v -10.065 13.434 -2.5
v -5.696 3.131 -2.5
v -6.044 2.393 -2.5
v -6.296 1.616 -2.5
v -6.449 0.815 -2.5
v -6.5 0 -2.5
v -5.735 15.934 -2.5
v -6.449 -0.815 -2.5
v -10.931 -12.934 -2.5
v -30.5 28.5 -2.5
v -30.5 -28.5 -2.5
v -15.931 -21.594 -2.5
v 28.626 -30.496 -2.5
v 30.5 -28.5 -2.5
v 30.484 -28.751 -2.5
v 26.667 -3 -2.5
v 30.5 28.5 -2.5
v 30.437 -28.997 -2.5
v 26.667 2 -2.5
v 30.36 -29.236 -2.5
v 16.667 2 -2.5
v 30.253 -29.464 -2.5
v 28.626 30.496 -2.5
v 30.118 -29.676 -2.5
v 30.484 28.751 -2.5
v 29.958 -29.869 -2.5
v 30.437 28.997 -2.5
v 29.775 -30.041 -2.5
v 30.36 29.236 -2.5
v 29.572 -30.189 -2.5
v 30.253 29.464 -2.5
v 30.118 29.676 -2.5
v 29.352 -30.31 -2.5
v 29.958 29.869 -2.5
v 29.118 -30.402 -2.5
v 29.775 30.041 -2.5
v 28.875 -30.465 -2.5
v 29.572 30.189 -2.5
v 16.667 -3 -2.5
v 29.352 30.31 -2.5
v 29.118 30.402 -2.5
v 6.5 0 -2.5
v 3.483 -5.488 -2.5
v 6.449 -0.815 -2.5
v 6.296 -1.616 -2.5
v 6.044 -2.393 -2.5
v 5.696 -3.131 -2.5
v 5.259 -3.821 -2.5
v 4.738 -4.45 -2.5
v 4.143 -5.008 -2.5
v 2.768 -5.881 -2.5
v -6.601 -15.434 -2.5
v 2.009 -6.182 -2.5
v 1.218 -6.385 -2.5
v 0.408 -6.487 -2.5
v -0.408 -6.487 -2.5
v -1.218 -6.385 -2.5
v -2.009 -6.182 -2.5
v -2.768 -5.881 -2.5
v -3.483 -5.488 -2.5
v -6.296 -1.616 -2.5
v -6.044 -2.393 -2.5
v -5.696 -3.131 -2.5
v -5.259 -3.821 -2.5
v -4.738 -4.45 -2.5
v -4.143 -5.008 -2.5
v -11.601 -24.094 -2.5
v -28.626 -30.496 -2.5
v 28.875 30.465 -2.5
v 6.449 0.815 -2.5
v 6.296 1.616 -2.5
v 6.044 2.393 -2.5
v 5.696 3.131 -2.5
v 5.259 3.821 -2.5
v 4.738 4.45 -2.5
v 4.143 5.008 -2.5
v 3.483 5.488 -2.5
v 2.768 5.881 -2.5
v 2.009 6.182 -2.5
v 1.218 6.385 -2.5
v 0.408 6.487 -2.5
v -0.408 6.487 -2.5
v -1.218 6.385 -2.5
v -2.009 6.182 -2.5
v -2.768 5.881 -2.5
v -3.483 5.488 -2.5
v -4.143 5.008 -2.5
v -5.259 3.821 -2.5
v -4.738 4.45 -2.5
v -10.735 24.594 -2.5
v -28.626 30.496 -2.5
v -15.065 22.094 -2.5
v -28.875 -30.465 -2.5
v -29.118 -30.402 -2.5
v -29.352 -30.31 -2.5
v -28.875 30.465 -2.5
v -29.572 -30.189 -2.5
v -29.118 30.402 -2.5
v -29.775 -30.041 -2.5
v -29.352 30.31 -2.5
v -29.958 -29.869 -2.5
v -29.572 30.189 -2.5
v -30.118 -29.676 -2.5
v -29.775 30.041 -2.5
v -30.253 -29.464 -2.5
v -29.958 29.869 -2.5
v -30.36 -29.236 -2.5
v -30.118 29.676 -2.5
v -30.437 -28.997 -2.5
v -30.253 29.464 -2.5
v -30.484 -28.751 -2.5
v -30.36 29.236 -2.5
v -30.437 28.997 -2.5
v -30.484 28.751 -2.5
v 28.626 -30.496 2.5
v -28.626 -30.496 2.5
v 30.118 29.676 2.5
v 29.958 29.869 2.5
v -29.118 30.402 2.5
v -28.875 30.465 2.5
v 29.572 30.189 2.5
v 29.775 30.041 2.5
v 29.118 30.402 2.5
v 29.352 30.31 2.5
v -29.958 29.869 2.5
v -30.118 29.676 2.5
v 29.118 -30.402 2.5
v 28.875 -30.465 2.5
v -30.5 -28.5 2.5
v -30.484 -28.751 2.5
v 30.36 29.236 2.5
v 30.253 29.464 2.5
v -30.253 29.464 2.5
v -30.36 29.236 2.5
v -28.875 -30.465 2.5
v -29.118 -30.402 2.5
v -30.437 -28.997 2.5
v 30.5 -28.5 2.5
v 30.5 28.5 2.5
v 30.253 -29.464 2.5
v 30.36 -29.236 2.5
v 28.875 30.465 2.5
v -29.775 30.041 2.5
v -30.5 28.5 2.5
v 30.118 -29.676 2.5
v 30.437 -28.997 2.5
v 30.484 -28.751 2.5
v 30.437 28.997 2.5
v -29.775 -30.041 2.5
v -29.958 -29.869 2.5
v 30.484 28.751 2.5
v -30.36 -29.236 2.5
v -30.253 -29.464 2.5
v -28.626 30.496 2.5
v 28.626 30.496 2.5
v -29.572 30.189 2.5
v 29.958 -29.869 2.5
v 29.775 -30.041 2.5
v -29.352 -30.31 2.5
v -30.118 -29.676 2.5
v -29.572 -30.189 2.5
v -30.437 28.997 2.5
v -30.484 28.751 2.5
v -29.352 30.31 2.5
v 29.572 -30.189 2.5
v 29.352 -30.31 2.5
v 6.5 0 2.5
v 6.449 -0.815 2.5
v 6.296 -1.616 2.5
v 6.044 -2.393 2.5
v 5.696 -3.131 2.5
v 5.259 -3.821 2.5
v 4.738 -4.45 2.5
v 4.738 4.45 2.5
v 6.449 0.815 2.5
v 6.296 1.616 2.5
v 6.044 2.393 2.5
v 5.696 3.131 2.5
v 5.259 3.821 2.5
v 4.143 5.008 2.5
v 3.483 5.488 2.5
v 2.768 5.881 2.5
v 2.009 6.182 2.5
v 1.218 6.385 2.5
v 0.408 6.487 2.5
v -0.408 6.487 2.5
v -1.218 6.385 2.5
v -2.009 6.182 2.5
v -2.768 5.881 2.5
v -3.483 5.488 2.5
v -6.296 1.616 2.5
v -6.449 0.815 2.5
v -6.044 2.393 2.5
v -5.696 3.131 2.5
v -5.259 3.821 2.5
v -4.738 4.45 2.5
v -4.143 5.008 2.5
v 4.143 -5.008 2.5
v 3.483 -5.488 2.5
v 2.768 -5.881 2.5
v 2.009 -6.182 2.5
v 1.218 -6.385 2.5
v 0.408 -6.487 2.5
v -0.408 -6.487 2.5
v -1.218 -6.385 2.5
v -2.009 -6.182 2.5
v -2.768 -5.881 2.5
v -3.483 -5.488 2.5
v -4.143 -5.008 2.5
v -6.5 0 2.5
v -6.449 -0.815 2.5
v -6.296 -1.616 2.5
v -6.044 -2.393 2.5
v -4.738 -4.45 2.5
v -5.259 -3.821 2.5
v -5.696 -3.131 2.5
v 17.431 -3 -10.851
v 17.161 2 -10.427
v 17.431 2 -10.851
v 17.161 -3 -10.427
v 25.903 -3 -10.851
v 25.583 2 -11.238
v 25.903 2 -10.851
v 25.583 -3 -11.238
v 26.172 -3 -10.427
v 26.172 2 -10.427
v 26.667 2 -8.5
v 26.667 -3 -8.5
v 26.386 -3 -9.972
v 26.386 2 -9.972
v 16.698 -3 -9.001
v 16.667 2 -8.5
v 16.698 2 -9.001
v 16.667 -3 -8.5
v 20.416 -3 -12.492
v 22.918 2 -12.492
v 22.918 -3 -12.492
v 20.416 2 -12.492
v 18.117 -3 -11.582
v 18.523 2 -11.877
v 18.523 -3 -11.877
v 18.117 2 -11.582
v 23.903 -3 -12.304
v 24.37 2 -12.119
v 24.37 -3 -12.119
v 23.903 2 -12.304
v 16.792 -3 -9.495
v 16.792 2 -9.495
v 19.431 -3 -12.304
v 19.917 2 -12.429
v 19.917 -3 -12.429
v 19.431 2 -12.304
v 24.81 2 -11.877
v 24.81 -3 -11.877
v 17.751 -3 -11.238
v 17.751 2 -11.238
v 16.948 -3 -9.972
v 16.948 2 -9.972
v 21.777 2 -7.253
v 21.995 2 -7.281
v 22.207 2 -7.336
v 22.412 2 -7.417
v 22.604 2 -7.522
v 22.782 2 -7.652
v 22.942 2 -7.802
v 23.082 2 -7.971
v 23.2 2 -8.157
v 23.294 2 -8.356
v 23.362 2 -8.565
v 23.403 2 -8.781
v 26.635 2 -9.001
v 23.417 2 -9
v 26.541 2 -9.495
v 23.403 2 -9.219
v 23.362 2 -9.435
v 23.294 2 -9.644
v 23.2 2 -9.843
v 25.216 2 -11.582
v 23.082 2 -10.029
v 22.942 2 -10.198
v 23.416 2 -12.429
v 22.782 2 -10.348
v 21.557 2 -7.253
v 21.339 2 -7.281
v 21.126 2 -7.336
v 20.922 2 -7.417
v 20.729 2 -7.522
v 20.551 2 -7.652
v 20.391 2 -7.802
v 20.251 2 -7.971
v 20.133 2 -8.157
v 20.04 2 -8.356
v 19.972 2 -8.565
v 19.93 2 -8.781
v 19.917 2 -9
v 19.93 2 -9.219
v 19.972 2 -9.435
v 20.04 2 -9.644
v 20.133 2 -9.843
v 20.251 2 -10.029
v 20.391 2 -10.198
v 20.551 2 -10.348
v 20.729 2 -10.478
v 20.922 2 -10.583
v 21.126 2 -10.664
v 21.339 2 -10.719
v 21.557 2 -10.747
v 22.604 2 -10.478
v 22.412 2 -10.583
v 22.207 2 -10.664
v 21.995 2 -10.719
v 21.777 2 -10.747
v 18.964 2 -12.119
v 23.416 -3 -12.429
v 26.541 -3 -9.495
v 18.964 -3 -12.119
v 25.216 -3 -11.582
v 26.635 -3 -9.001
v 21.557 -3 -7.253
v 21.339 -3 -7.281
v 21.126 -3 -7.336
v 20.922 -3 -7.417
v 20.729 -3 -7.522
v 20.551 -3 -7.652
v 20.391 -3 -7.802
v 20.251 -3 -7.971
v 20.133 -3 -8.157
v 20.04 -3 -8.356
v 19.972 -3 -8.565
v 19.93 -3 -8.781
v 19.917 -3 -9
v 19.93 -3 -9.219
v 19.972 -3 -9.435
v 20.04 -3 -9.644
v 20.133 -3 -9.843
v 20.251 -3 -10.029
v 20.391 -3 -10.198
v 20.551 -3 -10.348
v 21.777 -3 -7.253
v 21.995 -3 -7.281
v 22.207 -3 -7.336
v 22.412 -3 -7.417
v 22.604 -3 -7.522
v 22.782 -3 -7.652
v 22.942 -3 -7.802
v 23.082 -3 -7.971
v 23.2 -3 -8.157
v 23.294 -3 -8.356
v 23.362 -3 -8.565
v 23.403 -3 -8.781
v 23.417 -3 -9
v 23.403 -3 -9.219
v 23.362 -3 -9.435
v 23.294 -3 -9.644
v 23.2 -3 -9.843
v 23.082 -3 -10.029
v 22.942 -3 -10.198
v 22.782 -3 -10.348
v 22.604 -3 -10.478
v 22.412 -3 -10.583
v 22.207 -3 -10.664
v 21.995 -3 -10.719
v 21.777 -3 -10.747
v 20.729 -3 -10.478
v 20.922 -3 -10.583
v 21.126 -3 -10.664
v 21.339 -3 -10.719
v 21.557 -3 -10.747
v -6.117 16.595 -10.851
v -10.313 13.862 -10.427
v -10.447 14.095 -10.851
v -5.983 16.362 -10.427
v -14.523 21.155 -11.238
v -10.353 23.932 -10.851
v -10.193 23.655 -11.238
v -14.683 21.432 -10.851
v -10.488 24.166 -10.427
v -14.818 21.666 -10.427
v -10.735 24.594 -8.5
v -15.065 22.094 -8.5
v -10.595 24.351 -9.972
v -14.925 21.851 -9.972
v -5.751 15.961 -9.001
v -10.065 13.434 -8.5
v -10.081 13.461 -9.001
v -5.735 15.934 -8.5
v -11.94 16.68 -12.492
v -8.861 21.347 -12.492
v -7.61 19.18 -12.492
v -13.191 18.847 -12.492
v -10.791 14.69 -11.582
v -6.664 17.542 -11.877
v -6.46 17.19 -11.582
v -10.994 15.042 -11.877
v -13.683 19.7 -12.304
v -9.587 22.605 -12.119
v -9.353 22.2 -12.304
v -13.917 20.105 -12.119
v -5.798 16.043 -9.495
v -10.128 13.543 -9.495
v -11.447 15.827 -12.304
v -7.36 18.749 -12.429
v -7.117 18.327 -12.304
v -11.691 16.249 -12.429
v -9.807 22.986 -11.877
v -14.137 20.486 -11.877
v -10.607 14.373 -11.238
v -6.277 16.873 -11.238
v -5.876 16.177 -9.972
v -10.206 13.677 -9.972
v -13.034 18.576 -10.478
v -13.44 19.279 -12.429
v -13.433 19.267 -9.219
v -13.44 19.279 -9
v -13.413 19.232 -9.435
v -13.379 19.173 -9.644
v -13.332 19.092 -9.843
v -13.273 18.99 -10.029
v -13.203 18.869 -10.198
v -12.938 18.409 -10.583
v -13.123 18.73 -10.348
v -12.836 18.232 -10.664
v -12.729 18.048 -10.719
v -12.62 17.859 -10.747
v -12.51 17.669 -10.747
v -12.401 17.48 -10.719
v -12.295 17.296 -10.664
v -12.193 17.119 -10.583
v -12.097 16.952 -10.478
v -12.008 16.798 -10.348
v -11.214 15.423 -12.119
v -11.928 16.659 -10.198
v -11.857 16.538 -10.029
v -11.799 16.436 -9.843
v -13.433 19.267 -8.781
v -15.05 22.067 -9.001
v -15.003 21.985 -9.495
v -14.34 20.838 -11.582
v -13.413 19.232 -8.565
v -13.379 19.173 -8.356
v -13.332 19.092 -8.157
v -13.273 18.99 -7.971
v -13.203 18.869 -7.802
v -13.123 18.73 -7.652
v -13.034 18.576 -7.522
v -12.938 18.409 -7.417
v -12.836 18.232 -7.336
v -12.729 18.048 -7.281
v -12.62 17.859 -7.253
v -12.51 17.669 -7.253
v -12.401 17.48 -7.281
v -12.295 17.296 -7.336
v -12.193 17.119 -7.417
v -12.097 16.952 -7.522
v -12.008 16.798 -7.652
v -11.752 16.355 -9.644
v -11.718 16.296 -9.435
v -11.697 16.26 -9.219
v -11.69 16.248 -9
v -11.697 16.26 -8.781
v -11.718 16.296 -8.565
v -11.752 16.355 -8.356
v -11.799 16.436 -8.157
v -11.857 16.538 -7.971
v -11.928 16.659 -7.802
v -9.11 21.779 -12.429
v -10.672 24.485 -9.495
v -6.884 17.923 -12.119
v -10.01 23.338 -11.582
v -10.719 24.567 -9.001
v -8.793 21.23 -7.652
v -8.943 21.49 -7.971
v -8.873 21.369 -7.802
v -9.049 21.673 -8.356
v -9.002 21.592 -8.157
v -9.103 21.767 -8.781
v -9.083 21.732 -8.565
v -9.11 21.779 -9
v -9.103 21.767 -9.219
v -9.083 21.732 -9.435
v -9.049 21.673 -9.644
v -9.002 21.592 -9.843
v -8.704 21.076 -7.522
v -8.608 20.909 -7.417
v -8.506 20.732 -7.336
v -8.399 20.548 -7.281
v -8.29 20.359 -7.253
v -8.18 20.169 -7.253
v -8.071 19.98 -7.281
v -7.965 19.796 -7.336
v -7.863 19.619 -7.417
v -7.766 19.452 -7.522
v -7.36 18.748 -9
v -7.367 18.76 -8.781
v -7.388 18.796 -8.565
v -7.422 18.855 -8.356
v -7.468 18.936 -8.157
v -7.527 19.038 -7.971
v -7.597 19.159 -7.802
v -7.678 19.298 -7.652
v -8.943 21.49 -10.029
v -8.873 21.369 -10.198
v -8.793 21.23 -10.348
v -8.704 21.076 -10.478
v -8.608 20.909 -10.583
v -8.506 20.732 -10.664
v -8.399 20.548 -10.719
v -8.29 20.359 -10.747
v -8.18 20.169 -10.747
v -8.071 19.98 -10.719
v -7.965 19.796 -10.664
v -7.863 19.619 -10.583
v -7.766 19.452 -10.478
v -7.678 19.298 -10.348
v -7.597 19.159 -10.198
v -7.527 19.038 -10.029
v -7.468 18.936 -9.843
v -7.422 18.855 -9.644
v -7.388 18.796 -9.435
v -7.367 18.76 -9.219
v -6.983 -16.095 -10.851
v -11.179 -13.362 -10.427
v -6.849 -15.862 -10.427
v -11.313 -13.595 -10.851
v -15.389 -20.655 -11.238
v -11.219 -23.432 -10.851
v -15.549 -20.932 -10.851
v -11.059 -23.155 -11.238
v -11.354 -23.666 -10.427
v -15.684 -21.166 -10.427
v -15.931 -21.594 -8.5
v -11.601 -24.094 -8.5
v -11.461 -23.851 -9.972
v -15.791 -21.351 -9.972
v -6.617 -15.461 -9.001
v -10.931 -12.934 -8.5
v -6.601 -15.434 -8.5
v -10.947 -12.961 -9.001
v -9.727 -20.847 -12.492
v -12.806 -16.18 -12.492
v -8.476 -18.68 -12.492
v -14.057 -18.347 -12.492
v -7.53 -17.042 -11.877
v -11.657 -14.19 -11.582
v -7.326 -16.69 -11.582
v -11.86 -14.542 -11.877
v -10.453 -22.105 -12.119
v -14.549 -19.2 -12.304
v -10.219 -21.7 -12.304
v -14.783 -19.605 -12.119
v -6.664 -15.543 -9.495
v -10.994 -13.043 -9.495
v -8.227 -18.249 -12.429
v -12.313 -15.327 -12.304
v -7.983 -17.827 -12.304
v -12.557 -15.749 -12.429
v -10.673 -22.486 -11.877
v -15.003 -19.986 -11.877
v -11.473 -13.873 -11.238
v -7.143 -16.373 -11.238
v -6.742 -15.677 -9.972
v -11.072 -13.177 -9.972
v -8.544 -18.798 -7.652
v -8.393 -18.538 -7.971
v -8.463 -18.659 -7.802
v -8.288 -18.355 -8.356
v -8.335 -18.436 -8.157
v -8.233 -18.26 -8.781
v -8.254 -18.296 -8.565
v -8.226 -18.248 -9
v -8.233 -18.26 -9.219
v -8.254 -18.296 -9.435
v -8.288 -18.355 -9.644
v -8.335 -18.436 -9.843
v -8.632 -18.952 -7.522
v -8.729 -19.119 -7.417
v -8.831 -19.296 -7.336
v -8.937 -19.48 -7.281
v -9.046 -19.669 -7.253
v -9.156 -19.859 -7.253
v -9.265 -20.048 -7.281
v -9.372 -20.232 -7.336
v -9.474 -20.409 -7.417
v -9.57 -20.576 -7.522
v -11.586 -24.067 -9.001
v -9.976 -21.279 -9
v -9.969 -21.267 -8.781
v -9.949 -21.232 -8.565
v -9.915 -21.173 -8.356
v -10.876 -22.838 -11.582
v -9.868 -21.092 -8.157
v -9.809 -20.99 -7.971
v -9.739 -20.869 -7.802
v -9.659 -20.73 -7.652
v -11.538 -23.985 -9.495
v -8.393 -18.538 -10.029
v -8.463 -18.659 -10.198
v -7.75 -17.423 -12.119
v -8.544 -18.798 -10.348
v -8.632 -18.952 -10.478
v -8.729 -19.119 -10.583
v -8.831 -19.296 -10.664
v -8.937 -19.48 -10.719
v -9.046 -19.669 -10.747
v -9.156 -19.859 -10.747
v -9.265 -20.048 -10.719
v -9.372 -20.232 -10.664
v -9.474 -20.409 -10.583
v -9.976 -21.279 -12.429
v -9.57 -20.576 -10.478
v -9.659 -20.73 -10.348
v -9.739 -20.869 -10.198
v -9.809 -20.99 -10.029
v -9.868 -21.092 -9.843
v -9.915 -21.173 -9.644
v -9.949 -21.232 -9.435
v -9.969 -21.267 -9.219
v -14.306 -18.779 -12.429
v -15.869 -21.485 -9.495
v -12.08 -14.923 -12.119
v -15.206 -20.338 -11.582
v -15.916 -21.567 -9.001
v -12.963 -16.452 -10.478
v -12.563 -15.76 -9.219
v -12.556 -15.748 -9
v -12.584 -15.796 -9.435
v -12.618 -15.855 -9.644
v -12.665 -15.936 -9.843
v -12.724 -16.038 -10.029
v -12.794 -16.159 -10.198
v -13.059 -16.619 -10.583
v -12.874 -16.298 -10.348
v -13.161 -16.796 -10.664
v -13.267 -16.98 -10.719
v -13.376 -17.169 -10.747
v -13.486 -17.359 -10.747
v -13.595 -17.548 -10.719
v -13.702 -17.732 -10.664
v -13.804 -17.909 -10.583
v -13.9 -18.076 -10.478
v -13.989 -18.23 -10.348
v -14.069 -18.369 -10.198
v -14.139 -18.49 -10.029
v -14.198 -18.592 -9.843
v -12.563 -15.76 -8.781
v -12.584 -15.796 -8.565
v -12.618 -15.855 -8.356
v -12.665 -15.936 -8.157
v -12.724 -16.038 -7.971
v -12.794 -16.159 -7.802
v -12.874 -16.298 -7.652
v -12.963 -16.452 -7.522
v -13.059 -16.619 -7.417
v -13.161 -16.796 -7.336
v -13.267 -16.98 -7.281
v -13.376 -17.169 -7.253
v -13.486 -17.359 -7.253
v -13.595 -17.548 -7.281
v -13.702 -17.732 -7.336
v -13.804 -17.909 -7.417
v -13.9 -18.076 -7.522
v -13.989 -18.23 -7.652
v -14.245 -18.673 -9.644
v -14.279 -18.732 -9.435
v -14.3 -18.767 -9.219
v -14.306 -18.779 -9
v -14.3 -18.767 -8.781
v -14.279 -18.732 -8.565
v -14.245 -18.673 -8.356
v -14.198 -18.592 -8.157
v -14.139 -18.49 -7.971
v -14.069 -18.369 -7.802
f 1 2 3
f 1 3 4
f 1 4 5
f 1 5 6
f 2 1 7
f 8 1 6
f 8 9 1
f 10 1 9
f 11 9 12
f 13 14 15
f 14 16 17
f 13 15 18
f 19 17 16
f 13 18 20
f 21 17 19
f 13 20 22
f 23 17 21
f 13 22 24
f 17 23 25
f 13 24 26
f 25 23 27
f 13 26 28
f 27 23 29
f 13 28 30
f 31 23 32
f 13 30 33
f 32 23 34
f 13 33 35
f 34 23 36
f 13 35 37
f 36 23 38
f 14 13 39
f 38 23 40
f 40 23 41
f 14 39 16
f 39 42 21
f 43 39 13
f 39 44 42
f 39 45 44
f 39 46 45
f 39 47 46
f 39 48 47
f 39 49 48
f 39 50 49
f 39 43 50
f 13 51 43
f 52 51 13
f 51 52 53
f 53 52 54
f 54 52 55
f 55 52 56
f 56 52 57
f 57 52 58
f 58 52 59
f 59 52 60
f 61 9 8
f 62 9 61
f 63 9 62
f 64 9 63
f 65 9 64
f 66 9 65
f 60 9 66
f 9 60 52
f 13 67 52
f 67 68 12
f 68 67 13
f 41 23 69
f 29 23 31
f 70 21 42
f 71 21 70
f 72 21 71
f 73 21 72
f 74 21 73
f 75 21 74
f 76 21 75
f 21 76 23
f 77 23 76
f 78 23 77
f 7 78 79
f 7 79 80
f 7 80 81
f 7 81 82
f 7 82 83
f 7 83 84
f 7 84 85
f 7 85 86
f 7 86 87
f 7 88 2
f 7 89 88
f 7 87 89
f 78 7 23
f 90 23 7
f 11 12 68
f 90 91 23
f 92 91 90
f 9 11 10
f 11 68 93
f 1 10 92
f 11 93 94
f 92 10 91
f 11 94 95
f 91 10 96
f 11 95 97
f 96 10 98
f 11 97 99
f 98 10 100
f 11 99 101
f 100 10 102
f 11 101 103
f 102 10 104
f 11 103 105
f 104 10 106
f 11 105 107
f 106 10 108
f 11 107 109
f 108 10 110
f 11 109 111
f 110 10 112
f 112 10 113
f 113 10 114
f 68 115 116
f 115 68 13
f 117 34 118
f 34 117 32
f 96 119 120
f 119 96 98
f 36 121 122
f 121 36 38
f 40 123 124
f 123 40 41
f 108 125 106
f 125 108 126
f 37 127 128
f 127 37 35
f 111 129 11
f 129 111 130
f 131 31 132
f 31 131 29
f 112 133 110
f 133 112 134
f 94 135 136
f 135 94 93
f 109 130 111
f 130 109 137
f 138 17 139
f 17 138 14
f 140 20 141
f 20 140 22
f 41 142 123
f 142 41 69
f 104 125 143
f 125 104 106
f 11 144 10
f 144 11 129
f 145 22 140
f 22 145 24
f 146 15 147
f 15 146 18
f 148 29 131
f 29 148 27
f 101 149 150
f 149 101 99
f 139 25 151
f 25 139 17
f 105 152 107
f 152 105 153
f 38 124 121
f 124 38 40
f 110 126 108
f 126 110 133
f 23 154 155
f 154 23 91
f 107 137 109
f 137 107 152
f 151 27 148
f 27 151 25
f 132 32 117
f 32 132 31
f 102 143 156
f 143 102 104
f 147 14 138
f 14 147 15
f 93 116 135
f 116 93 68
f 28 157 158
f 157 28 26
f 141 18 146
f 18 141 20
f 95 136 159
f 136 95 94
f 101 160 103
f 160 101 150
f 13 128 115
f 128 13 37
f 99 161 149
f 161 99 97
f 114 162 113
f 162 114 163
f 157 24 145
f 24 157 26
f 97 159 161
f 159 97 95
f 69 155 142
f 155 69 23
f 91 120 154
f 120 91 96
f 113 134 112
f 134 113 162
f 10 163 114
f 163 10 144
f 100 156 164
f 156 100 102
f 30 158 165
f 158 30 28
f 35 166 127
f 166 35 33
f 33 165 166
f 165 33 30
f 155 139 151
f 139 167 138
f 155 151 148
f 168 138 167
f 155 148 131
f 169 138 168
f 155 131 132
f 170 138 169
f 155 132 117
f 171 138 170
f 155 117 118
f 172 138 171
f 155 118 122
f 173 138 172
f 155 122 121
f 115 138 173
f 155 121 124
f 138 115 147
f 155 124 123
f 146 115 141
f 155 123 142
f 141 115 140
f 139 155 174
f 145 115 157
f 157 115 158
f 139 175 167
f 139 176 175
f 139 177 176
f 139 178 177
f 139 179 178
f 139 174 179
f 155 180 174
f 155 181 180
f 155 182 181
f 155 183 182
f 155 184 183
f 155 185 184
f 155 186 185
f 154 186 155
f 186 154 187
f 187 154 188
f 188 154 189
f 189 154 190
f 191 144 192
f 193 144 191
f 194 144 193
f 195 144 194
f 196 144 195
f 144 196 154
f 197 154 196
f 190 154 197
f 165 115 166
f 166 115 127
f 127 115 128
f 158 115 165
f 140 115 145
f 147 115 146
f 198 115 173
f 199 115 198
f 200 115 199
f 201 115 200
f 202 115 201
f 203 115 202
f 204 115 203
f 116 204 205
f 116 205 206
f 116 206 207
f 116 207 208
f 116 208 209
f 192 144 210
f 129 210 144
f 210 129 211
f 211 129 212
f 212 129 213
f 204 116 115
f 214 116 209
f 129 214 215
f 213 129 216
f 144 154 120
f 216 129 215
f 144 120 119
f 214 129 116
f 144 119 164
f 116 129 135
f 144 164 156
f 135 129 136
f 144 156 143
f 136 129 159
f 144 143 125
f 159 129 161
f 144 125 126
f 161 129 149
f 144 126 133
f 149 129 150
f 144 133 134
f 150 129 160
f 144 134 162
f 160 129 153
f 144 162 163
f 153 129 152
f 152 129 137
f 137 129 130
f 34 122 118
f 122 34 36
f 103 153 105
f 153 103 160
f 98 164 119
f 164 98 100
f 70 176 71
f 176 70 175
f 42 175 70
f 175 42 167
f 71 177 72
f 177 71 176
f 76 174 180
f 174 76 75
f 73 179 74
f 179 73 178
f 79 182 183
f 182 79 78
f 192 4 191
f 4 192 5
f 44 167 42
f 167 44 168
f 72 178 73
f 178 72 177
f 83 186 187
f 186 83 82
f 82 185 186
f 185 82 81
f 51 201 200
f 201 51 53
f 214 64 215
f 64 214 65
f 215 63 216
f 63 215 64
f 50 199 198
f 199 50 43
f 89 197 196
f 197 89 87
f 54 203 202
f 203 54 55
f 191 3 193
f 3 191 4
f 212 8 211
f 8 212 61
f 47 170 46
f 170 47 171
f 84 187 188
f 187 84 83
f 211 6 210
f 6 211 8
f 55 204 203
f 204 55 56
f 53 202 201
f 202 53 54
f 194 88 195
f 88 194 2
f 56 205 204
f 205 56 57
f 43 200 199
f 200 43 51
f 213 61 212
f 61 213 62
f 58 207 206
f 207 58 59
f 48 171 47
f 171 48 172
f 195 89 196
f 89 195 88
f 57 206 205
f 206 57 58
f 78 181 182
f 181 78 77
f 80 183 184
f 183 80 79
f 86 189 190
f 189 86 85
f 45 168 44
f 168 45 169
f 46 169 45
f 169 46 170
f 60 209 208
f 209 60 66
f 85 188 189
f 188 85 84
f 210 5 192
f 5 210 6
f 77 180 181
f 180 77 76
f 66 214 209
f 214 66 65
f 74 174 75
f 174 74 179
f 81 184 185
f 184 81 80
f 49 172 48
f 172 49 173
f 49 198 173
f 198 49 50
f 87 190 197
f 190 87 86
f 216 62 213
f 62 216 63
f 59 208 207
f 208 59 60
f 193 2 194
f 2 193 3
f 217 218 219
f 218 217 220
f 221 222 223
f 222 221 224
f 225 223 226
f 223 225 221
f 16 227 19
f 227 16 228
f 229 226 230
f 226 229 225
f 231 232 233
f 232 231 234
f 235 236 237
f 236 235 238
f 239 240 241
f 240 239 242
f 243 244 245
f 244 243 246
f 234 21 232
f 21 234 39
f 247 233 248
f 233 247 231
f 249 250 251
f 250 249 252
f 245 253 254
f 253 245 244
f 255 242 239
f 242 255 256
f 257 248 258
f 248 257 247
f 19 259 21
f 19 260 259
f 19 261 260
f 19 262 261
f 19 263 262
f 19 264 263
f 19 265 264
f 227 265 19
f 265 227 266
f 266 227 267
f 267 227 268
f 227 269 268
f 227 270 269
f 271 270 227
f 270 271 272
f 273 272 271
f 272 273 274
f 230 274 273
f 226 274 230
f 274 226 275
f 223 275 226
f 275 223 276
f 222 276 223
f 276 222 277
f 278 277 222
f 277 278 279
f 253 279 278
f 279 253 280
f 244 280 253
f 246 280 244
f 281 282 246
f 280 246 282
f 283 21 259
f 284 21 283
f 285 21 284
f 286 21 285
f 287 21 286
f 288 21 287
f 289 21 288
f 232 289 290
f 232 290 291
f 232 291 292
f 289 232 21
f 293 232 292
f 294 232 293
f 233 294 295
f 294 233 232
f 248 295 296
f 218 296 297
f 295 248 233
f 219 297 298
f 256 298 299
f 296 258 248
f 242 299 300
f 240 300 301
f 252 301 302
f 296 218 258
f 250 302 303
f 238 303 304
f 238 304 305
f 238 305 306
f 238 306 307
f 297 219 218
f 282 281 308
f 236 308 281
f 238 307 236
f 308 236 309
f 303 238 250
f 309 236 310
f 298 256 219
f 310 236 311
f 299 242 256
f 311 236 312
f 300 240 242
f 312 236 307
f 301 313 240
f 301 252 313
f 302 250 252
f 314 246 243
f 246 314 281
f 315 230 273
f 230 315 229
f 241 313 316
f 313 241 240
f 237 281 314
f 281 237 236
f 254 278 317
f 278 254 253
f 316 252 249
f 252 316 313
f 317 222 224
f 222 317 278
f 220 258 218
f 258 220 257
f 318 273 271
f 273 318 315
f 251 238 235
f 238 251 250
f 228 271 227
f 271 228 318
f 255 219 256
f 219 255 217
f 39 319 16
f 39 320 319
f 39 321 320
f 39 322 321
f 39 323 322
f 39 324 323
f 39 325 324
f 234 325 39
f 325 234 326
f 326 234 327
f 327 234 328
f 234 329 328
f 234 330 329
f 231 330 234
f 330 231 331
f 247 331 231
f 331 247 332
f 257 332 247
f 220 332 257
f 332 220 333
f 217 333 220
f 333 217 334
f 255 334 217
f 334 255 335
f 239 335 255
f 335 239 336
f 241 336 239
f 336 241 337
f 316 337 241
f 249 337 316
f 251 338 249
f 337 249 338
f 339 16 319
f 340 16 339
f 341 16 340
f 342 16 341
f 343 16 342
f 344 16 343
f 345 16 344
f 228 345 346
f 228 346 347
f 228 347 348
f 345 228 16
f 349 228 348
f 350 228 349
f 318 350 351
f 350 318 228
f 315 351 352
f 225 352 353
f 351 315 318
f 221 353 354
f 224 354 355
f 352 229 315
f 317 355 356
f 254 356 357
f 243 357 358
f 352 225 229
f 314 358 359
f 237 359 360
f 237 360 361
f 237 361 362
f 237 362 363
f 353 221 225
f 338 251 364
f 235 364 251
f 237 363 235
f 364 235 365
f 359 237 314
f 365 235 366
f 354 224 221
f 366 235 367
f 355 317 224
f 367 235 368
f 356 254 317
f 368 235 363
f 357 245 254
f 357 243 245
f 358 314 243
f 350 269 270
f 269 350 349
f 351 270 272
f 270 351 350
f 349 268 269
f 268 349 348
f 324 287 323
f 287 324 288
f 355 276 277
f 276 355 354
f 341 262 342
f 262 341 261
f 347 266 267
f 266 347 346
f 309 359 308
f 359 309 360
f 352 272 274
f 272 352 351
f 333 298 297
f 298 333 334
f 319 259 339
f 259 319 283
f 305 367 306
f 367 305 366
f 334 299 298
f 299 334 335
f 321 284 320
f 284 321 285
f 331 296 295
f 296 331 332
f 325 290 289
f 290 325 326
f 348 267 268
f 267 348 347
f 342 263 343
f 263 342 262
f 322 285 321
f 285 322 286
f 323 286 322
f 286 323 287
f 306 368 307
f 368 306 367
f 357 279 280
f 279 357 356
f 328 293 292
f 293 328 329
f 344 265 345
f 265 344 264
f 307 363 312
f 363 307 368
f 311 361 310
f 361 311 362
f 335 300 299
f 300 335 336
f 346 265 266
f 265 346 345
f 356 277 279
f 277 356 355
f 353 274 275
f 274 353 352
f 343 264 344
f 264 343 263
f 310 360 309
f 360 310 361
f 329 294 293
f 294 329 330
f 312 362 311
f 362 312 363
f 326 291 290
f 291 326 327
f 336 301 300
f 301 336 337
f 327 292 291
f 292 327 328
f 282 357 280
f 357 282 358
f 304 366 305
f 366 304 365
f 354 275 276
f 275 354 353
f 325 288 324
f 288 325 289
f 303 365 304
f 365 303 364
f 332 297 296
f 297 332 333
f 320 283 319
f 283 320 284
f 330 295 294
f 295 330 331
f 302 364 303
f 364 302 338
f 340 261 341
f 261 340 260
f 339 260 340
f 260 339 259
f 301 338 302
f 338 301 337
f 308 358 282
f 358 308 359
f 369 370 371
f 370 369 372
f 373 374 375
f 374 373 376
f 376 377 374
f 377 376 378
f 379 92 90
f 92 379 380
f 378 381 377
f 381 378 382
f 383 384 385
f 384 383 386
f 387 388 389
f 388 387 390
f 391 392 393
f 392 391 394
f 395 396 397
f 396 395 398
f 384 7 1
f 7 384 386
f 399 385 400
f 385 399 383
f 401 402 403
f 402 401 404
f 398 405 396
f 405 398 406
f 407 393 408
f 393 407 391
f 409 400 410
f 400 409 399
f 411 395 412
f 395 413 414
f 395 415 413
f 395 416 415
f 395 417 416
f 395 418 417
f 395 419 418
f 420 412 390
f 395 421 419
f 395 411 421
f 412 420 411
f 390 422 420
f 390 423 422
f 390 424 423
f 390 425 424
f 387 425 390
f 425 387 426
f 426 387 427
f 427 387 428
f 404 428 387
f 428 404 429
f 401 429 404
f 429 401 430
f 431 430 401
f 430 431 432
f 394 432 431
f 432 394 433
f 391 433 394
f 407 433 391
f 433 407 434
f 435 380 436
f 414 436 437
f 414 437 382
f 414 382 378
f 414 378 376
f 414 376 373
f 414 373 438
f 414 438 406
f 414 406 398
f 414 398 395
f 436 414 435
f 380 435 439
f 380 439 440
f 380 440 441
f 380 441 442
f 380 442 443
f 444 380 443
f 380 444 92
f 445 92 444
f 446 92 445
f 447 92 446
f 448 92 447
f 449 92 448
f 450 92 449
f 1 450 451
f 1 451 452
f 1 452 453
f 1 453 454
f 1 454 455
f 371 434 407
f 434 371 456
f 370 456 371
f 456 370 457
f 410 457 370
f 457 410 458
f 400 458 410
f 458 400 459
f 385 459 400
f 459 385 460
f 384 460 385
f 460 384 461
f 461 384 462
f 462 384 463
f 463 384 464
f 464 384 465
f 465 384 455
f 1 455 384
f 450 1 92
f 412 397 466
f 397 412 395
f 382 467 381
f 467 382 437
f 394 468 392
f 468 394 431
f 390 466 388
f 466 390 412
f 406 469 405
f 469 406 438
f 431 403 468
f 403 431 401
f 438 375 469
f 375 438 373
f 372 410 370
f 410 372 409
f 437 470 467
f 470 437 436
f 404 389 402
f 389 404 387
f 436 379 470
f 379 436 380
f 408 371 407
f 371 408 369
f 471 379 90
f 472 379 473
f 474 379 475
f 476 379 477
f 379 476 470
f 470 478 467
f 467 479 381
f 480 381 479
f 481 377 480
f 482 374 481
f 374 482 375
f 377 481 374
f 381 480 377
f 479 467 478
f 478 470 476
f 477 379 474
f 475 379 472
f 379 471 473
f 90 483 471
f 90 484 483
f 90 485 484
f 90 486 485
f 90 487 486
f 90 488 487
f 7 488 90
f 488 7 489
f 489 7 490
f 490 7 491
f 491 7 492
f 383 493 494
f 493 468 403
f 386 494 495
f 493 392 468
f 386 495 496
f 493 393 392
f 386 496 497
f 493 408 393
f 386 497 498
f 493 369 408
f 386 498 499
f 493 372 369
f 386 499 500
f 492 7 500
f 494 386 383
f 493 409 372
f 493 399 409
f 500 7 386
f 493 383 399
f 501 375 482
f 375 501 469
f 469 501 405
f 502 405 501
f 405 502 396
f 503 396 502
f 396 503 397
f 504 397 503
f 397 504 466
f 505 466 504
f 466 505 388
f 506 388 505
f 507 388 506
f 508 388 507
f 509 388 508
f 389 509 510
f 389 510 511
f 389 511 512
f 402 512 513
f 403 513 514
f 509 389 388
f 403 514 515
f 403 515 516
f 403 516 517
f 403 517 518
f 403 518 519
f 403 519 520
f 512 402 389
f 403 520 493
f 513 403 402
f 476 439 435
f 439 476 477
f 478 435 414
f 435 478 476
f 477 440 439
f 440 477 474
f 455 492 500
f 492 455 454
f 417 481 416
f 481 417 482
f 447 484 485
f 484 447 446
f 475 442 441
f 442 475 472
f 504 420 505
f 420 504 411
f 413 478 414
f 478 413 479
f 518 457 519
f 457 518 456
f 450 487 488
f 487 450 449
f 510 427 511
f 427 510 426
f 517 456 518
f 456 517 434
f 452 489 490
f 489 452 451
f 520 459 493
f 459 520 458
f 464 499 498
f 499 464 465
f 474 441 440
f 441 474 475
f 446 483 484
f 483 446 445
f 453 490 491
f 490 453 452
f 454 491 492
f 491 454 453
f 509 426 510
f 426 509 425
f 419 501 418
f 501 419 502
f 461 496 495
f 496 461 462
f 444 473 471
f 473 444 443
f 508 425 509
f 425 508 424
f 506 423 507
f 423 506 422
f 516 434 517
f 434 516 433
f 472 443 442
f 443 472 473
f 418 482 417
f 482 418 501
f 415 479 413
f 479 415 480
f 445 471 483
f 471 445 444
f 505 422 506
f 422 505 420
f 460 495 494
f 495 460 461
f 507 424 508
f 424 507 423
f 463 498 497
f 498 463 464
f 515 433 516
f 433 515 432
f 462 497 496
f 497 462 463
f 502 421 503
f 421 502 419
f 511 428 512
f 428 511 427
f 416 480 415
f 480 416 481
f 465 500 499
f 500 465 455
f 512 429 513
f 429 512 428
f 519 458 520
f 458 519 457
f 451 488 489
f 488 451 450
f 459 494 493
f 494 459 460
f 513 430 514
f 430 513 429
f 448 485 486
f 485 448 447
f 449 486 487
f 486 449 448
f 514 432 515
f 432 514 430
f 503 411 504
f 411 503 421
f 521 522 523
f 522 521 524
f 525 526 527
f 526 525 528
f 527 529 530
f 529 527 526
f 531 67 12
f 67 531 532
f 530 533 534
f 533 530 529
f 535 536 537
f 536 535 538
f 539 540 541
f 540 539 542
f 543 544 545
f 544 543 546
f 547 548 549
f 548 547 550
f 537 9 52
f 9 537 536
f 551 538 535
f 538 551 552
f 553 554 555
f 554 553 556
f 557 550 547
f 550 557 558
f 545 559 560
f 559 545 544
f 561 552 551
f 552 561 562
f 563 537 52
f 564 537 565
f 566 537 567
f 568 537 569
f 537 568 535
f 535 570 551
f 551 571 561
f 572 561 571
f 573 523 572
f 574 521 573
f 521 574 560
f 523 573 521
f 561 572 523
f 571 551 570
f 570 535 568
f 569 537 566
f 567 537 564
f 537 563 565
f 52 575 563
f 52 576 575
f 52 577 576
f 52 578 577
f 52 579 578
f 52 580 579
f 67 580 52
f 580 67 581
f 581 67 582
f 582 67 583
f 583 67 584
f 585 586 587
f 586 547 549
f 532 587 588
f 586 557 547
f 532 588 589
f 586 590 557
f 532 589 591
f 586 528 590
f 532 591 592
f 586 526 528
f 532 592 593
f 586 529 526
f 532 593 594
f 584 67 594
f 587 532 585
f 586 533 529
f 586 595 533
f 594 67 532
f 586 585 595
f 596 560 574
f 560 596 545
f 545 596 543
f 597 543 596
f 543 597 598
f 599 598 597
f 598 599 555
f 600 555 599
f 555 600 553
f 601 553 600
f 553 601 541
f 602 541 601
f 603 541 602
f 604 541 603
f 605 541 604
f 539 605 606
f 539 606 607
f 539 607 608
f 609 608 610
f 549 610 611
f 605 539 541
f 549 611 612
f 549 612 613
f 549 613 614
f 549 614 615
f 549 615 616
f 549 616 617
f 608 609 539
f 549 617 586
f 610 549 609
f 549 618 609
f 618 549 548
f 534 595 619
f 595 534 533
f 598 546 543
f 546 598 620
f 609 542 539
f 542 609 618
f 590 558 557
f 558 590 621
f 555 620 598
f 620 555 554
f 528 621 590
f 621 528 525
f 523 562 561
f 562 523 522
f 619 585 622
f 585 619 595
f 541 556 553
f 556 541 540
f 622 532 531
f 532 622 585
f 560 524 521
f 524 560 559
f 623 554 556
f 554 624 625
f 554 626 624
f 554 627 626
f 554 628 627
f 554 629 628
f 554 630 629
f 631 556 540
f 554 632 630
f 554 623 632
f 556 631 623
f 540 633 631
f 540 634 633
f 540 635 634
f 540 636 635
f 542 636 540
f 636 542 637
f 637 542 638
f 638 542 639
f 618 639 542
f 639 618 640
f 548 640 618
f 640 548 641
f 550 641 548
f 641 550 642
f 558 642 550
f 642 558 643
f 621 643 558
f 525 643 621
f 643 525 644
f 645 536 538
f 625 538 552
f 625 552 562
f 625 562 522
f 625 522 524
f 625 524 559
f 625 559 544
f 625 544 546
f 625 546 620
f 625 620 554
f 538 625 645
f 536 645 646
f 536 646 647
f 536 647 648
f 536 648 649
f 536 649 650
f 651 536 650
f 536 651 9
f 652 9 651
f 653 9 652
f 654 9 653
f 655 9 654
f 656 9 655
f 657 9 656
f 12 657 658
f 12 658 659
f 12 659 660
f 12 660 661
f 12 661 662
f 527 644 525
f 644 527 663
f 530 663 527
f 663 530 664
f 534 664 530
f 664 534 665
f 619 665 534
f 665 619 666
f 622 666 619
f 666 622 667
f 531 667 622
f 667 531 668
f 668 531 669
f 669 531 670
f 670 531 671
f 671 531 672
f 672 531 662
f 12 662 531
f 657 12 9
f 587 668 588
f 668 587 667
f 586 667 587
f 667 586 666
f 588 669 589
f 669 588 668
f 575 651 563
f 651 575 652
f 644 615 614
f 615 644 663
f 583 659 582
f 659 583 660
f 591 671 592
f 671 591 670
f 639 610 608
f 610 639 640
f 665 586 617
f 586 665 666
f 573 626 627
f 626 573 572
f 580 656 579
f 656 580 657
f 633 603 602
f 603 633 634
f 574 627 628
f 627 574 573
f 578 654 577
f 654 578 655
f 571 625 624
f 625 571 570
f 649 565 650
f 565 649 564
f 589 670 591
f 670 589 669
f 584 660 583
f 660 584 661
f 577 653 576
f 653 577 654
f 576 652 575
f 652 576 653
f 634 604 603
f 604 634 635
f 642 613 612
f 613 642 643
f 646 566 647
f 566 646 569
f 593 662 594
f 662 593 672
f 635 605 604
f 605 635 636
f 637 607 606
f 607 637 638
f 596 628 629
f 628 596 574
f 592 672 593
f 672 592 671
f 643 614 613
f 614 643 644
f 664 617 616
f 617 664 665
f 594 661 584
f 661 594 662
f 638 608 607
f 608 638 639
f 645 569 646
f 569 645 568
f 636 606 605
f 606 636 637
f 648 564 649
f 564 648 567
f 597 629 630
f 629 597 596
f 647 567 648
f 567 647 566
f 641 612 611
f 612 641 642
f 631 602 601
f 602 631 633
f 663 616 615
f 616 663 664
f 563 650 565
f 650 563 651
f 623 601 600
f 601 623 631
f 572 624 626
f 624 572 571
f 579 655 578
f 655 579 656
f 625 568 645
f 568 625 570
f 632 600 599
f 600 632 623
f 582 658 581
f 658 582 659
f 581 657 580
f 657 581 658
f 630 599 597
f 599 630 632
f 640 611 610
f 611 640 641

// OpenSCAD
$fn=50;

LEGSCREW=3.5;

module leg(length = 150, thick = 10, screwhole = 3) {
    union() {
        difference() {
            //leg
            translate([0, 0, -0.5])
                minkowski() {
                    cylrad=thick/2.5;
                    cube([length-(2*cylrad), thick-(2*cylrad), thick-1], true);
                    cylinder(r=cylrad,h=1, true);
                }
            // Screwhole
            translate([(length/2)-screwhole*1.5, 0, 0])
                cylinder(h = thick + 10, r = screwhole/2, center = true);
                
            // Mountcut
            translate([(length/2)-screwhole, 0, 0])
                cube([thick*1.25, thick+5, thick*0.5], true);   

            //Speedholes
            for(i= [ (-length/2)+(1*thick) : 0.75*thick : (length/2)-(1*thick)] ) {
                translate([i, 0, 0]) cylinder(h = thick + 10, r = (thick/2)/2, center = true);
            }
        }
    }
}


module mountbase(length = 40, thick = 5, mountthick=5, screwhole = 3) {
    union() {
        //Plate
        translate([0, 0, -0.5])
            difference() {
                minkowski() {
                    cylrad=thick/2.5;
                    cube([length-(4*cylrad), length-(4*cylrad), thick-1], true);
                    cylinder(r=cylrad,h=1, true);
                }
                cylinder(h=thick+2, r=6.5, center=true);
            }

        //Mounts
        cylrad=mountthick/2.5;
        for( i = [0 : 120 : 360] ) {
            rotate([0, 0, i]) {
                translate([length/3, 0, -(mountthick+thick-cylrad)/2  ]) {
                    difference() {
                        // Foot
                        minkowski() {
                           cube([mountthick-(2*cylrad), mountthick/2 - 1, mountthick-cylrad], true);
                           rotate([90,0,0]) cylinder(h=1,r=cylrad, true);
                        }
                        //Screwhole
                        rotate([90,0,0])
                         translate([0,-(1*screwhole),0])
                            cylinder(h = thick + 10, r = screwhole/2, center = true);
                     }
                 }
             }
         }
     }
}




*leg(150, 10, LEGSCREW);
mountbase(65, 5, 10, LEGSCREW);
